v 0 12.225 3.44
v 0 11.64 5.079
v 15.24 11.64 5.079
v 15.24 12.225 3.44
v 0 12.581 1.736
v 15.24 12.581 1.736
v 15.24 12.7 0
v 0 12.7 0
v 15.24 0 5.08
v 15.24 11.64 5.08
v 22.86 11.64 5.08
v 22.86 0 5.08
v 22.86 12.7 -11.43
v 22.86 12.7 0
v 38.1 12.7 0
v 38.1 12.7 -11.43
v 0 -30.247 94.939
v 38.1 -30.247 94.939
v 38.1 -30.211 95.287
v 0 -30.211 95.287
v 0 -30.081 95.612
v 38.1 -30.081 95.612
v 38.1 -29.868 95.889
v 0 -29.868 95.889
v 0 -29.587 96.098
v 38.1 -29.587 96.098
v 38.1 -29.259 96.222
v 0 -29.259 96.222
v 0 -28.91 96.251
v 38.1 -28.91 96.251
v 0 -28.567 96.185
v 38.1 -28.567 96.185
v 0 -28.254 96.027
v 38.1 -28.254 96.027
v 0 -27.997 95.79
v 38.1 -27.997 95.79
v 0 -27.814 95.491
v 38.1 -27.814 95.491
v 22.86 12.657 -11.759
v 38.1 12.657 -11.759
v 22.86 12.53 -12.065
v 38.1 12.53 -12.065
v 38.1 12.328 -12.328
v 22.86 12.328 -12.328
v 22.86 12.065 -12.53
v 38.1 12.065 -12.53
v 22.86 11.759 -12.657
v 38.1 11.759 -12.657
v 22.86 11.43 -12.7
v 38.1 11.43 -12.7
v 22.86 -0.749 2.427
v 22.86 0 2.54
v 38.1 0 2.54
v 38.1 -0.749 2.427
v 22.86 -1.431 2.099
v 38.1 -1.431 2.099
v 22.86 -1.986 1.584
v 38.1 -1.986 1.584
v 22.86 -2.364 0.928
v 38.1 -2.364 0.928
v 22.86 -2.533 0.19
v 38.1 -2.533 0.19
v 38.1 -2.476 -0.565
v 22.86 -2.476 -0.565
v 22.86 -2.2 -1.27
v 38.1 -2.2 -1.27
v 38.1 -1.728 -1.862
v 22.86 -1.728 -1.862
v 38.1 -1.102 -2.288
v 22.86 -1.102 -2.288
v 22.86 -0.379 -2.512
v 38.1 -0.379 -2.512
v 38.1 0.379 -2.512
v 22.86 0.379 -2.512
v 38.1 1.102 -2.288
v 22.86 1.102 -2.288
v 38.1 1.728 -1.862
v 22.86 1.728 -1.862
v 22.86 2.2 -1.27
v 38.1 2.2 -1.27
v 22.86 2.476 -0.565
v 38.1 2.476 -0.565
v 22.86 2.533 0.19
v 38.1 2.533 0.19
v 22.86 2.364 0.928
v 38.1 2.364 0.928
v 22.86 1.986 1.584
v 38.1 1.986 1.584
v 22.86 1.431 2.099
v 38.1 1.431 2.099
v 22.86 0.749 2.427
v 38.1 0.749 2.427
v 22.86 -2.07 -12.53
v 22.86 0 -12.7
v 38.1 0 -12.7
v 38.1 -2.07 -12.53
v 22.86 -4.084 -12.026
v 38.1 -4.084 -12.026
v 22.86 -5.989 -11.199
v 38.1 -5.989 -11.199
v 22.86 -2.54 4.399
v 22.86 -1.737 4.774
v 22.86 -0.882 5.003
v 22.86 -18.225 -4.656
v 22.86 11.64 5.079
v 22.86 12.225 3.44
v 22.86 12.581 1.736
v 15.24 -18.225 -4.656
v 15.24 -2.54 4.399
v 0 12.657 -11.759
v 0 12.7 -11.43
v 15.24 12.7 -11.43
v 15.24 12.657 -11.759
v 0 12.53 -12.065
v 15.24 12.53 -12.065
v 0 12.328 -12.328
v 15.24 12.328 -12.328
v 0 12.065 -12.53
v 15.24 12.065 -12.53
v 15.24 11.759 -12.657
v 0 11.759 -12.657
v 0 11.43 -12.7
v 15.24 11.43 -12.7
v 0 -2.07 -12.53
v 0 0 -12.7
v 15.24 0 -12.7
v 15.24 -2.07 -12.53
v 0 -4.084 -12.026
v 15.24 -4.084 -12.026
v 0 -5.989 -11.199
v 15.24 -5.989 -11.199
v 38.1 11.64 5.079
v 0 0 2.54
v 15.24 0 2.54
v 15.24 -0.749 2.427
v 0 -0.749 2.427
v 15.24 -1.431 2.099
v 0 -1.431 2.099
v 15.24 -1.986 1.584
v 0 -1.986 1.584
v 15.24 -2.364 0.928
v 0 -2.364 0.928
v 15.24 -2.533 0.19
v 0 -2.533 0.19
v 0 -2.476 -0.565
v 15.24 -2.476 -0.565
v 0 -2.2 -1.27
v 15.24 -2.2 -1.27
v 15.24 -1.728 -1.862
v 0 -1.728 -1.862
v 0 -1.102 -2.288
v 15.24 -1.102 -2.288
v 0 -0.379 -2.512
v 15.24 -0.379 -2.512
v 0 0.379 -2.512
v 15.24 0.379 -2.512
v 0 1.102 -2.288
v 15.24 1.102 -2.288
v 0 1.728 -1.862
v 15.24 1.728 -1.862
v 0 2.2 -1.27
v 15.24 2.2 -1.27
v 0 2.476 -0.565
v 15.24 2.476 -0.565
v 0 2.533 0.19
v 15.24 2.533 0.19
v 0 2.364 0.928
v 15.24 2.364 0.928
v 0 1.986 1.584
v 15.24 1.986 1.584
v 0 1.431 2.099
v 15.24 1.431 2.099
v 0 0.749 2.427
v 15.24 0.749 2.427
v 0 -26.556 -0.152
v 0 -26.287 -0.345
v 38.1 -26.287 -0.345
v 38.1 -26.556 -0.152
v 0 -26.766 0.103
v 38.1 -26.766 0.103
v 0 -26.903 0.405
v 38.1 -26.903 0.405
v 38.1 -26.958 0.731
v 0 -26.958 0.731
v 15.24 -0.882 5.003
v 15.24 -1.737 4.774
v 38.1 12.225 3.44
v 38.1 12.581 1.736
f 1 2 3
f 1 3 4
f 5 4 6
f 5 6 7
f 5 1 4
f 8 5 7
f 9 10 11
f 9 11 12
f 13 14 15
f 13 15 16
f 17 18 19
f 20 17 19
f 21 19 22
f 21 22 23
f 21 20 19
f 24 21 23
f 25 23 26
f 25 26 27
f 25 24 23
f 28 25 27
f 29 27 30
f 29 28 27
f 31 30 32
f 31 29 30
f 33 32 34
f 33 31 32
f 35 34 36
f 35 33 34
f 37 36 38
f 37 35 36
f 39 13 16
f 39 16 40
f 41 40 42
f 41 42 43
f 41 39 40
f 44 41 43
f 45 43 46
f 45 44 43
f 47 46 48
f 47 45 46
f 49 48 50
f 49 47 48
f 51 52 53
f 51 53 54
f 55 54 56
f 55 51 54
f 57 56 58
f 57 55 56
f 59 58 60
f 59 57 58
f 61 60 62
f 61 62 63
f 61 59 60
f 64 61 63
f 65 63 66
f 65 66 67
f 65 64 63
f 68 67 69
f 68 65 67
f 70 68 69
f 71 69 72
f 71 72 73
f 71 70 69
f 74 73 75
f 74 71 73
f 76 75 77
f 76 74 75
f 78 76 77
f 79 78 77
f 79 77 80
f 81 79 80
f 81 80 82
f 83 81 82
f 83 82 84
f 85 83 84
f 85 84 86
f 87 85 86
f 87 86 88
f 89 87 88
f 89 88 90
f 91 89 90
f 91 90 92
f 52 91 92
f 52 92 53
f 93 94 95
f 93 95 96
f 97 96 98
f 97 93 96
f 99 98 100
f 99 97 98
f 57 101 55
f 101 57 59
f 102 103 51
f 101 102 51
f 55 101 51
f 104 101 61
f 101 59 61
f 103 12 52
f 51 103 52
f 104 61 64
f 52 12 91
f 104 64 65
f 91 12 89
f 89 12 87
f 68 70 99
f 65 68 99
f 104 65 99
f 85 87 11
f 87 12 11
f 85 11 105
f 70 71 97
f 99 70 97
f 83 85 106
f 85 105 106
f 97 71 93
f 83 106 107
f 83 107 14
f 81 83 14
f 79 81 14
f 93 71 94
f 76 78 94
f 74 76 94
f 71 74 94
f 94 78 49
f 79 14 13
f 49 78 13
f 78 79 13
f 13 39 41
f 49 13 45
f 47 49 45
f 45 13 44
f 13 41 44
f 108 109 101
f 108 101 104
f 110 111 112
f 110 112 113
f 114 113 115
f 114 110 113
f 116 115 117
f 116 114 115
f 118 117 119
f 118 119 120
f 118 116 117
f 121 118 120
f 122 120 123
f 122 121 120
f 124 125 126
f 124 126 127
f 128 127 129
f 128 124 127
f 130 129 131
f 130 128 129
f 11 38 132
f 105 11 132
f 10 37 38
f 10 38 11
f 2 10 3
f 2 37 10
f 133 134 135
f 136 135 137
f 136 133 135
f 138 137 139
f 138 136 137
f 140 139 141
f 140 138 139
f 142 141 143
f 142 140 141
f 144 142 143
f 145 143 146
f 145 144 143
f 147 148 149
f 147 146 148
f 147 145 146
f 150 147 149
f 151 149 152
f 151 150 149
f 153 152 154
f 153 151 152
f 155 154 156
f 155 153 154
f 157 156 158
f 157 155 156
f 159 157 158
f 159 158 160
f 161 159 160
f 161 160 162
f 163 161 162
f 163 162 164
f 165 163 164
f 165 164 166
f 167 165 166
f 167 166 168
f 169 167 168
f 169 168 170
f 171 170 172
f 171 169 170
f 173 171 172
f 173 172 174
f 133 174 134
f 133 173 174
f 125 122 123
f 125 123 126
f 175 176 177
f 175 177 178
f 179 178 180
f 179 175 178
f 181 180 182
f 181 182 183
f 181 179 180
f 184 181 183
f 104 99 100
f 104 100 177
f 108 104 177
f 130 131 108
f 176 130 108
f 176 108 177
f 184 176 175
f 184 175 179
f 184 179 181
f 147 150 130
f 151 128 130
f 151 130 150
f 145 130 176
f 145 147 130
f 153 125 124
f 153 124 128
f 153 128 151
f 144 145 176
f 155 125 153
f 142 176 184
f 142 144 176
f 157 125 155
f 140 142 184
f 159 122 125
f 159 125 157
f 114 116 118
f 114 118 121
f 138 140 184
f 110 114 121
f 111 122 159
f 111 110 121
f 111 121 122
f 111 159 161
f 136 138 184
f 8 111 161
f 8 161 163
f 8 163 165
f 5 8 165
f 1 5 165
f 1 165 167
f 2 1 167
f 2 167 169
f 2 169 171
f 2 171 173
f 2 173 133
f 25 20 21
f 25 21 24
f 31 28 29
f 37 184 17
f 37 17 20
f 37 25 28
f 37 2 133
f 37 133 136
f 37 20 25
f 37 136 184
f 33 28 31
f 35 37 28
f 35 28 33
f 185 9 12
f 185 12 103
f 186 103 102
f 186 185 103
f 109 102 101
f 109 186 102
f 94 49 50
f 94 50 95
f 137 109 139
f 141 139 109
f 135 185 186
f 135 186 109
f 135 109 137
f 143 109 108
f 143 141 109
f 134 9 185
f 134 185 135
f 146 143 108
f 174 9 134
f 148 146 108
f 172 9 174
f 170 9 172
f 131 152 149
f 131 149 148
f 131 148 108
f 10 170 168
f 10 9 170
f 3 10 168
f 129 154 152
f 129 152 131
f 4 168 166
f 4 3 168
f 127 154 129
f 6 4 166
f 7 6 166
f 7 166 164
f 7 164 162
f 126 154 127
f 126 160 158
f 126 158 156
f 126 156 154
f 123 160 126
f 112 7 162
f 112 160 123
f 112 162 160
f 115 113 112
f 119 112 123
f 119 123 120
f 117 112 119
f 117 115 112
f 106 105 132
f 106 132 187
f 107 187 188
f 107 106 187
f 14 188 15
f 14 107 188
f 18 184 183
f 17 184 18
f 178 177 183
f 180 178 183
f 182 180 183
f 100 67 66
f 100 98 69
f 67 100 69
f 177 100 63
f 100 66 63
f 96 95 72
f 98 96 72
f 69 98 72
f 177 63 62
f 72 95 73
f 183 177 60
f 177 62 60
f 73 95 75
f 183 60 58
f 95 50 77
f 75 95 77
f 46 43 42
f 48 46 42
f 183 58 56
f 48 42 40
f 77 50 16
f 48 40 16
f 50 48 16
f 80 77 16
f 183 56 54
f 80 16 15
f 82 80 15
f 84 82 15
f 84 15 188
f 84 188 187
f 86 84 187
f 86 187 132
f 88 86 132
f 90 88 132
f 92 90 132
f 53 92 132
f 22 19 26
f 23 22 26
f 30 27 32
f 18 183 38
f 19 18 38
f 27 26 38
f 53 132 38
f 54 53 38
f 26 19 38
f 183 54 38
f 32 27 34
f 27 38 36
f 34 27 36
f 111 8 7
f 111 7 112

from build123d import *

# Parameters (mm, degrees)
SKETCH1_R               = 2.54
BOSS_EXTRUDE1_DEPTH     = 38.1
CUT_EXTRUDE1_DEPTH      = 3.81
CUT_EXTRUDE1_DEPTH_BACK = 3.81
SKETCH4_R               = 5.08


with BuildPart() as part:
    # Sketch1 → Boss-Extrude1 (new body)
    with BuildSketch(Plane(origin=(0, 0, 0), x_dir=(0, 0, -1), z_dir=(1, 0, 0))):
        with BuildLine():
            Line((11.199311053, -5.988775495), (0.344819113, -26.287220755))
            ThreePointArc((0.344819113, -26.287220755), (-0.103387784, -26.766158861), (-0.730789632, -26.957569556))
            Line((-0.730789632, -26.957569556), (-94.938797587, -30.247385686))
            ThreePointArc((-94.938797587, -30.247385686), (-96.22161935, -29.25926293), (-95.4910689, -27.814162831))
            Line((-95.4910689, -27.814162831), (-5.079489514, 11.639965046))
            ThreePointArc((-5.079489514, 11.639965046), (-2.594459858, 12.432167069), (0, 12.7))
            Line((0, 12.7), (11.43, 12.7))
            ThreePointArc((11.43, 12.7), (12.328025612, 12.328025612), (12.7, 11.43))
            Line((12.7, 11.43), (12.7, 0))
            ThreePointArc((12.7, 0), (12.31911625, -3.086968547), (11.199311053, -5.988775495))
        make_face()
        with Locations(Location((0, 0, 0), (0, 0, 180))):
            Circle(SKETCH1_R, mode=Mode.SUBTRACT)
    extrude(amount=BOSS_EXTRUDE1_DEPTH)

    # Sketch4 → Cut-Extrude1 (cut, two sides: drawn at the far end of the back side and taken through both)
    with BuildSketch(Plane(origin=(19.05, 0, 0), x_dir=(0, 0, -1), z_dir=(1, 0, 0)).offset(-CUT_EXTRUDE1_DEPTH_BACK)):
        with BuildLine():
            Line((-5.08, 25.792214679), (-5.08, 0))
            ThreePointArc((-5.08, 0), (0, 5.08), (5.08, 0))
            ThreePointArc((5.08, 0), (1.314800749, -4.906903198), (-4.399409051, -2.54))
            Line((-4.399409051, -2.54), (14.172067989, -34.706741806))
            Line((14.172067989, -34.706741806), (14.172067989, 25.792214679))
            Line((14.172067989, 25.792214679), (-5.08, 25.792214679))
        make_face()
        Circle(SKETCH4_R)
    extrude(amount=CUT_EXTRUDE1_DEPTH + CUT_EXTRUDE1_DEPTH_BACK, mode=Mode.SUBTRACT)


solid = part.part
